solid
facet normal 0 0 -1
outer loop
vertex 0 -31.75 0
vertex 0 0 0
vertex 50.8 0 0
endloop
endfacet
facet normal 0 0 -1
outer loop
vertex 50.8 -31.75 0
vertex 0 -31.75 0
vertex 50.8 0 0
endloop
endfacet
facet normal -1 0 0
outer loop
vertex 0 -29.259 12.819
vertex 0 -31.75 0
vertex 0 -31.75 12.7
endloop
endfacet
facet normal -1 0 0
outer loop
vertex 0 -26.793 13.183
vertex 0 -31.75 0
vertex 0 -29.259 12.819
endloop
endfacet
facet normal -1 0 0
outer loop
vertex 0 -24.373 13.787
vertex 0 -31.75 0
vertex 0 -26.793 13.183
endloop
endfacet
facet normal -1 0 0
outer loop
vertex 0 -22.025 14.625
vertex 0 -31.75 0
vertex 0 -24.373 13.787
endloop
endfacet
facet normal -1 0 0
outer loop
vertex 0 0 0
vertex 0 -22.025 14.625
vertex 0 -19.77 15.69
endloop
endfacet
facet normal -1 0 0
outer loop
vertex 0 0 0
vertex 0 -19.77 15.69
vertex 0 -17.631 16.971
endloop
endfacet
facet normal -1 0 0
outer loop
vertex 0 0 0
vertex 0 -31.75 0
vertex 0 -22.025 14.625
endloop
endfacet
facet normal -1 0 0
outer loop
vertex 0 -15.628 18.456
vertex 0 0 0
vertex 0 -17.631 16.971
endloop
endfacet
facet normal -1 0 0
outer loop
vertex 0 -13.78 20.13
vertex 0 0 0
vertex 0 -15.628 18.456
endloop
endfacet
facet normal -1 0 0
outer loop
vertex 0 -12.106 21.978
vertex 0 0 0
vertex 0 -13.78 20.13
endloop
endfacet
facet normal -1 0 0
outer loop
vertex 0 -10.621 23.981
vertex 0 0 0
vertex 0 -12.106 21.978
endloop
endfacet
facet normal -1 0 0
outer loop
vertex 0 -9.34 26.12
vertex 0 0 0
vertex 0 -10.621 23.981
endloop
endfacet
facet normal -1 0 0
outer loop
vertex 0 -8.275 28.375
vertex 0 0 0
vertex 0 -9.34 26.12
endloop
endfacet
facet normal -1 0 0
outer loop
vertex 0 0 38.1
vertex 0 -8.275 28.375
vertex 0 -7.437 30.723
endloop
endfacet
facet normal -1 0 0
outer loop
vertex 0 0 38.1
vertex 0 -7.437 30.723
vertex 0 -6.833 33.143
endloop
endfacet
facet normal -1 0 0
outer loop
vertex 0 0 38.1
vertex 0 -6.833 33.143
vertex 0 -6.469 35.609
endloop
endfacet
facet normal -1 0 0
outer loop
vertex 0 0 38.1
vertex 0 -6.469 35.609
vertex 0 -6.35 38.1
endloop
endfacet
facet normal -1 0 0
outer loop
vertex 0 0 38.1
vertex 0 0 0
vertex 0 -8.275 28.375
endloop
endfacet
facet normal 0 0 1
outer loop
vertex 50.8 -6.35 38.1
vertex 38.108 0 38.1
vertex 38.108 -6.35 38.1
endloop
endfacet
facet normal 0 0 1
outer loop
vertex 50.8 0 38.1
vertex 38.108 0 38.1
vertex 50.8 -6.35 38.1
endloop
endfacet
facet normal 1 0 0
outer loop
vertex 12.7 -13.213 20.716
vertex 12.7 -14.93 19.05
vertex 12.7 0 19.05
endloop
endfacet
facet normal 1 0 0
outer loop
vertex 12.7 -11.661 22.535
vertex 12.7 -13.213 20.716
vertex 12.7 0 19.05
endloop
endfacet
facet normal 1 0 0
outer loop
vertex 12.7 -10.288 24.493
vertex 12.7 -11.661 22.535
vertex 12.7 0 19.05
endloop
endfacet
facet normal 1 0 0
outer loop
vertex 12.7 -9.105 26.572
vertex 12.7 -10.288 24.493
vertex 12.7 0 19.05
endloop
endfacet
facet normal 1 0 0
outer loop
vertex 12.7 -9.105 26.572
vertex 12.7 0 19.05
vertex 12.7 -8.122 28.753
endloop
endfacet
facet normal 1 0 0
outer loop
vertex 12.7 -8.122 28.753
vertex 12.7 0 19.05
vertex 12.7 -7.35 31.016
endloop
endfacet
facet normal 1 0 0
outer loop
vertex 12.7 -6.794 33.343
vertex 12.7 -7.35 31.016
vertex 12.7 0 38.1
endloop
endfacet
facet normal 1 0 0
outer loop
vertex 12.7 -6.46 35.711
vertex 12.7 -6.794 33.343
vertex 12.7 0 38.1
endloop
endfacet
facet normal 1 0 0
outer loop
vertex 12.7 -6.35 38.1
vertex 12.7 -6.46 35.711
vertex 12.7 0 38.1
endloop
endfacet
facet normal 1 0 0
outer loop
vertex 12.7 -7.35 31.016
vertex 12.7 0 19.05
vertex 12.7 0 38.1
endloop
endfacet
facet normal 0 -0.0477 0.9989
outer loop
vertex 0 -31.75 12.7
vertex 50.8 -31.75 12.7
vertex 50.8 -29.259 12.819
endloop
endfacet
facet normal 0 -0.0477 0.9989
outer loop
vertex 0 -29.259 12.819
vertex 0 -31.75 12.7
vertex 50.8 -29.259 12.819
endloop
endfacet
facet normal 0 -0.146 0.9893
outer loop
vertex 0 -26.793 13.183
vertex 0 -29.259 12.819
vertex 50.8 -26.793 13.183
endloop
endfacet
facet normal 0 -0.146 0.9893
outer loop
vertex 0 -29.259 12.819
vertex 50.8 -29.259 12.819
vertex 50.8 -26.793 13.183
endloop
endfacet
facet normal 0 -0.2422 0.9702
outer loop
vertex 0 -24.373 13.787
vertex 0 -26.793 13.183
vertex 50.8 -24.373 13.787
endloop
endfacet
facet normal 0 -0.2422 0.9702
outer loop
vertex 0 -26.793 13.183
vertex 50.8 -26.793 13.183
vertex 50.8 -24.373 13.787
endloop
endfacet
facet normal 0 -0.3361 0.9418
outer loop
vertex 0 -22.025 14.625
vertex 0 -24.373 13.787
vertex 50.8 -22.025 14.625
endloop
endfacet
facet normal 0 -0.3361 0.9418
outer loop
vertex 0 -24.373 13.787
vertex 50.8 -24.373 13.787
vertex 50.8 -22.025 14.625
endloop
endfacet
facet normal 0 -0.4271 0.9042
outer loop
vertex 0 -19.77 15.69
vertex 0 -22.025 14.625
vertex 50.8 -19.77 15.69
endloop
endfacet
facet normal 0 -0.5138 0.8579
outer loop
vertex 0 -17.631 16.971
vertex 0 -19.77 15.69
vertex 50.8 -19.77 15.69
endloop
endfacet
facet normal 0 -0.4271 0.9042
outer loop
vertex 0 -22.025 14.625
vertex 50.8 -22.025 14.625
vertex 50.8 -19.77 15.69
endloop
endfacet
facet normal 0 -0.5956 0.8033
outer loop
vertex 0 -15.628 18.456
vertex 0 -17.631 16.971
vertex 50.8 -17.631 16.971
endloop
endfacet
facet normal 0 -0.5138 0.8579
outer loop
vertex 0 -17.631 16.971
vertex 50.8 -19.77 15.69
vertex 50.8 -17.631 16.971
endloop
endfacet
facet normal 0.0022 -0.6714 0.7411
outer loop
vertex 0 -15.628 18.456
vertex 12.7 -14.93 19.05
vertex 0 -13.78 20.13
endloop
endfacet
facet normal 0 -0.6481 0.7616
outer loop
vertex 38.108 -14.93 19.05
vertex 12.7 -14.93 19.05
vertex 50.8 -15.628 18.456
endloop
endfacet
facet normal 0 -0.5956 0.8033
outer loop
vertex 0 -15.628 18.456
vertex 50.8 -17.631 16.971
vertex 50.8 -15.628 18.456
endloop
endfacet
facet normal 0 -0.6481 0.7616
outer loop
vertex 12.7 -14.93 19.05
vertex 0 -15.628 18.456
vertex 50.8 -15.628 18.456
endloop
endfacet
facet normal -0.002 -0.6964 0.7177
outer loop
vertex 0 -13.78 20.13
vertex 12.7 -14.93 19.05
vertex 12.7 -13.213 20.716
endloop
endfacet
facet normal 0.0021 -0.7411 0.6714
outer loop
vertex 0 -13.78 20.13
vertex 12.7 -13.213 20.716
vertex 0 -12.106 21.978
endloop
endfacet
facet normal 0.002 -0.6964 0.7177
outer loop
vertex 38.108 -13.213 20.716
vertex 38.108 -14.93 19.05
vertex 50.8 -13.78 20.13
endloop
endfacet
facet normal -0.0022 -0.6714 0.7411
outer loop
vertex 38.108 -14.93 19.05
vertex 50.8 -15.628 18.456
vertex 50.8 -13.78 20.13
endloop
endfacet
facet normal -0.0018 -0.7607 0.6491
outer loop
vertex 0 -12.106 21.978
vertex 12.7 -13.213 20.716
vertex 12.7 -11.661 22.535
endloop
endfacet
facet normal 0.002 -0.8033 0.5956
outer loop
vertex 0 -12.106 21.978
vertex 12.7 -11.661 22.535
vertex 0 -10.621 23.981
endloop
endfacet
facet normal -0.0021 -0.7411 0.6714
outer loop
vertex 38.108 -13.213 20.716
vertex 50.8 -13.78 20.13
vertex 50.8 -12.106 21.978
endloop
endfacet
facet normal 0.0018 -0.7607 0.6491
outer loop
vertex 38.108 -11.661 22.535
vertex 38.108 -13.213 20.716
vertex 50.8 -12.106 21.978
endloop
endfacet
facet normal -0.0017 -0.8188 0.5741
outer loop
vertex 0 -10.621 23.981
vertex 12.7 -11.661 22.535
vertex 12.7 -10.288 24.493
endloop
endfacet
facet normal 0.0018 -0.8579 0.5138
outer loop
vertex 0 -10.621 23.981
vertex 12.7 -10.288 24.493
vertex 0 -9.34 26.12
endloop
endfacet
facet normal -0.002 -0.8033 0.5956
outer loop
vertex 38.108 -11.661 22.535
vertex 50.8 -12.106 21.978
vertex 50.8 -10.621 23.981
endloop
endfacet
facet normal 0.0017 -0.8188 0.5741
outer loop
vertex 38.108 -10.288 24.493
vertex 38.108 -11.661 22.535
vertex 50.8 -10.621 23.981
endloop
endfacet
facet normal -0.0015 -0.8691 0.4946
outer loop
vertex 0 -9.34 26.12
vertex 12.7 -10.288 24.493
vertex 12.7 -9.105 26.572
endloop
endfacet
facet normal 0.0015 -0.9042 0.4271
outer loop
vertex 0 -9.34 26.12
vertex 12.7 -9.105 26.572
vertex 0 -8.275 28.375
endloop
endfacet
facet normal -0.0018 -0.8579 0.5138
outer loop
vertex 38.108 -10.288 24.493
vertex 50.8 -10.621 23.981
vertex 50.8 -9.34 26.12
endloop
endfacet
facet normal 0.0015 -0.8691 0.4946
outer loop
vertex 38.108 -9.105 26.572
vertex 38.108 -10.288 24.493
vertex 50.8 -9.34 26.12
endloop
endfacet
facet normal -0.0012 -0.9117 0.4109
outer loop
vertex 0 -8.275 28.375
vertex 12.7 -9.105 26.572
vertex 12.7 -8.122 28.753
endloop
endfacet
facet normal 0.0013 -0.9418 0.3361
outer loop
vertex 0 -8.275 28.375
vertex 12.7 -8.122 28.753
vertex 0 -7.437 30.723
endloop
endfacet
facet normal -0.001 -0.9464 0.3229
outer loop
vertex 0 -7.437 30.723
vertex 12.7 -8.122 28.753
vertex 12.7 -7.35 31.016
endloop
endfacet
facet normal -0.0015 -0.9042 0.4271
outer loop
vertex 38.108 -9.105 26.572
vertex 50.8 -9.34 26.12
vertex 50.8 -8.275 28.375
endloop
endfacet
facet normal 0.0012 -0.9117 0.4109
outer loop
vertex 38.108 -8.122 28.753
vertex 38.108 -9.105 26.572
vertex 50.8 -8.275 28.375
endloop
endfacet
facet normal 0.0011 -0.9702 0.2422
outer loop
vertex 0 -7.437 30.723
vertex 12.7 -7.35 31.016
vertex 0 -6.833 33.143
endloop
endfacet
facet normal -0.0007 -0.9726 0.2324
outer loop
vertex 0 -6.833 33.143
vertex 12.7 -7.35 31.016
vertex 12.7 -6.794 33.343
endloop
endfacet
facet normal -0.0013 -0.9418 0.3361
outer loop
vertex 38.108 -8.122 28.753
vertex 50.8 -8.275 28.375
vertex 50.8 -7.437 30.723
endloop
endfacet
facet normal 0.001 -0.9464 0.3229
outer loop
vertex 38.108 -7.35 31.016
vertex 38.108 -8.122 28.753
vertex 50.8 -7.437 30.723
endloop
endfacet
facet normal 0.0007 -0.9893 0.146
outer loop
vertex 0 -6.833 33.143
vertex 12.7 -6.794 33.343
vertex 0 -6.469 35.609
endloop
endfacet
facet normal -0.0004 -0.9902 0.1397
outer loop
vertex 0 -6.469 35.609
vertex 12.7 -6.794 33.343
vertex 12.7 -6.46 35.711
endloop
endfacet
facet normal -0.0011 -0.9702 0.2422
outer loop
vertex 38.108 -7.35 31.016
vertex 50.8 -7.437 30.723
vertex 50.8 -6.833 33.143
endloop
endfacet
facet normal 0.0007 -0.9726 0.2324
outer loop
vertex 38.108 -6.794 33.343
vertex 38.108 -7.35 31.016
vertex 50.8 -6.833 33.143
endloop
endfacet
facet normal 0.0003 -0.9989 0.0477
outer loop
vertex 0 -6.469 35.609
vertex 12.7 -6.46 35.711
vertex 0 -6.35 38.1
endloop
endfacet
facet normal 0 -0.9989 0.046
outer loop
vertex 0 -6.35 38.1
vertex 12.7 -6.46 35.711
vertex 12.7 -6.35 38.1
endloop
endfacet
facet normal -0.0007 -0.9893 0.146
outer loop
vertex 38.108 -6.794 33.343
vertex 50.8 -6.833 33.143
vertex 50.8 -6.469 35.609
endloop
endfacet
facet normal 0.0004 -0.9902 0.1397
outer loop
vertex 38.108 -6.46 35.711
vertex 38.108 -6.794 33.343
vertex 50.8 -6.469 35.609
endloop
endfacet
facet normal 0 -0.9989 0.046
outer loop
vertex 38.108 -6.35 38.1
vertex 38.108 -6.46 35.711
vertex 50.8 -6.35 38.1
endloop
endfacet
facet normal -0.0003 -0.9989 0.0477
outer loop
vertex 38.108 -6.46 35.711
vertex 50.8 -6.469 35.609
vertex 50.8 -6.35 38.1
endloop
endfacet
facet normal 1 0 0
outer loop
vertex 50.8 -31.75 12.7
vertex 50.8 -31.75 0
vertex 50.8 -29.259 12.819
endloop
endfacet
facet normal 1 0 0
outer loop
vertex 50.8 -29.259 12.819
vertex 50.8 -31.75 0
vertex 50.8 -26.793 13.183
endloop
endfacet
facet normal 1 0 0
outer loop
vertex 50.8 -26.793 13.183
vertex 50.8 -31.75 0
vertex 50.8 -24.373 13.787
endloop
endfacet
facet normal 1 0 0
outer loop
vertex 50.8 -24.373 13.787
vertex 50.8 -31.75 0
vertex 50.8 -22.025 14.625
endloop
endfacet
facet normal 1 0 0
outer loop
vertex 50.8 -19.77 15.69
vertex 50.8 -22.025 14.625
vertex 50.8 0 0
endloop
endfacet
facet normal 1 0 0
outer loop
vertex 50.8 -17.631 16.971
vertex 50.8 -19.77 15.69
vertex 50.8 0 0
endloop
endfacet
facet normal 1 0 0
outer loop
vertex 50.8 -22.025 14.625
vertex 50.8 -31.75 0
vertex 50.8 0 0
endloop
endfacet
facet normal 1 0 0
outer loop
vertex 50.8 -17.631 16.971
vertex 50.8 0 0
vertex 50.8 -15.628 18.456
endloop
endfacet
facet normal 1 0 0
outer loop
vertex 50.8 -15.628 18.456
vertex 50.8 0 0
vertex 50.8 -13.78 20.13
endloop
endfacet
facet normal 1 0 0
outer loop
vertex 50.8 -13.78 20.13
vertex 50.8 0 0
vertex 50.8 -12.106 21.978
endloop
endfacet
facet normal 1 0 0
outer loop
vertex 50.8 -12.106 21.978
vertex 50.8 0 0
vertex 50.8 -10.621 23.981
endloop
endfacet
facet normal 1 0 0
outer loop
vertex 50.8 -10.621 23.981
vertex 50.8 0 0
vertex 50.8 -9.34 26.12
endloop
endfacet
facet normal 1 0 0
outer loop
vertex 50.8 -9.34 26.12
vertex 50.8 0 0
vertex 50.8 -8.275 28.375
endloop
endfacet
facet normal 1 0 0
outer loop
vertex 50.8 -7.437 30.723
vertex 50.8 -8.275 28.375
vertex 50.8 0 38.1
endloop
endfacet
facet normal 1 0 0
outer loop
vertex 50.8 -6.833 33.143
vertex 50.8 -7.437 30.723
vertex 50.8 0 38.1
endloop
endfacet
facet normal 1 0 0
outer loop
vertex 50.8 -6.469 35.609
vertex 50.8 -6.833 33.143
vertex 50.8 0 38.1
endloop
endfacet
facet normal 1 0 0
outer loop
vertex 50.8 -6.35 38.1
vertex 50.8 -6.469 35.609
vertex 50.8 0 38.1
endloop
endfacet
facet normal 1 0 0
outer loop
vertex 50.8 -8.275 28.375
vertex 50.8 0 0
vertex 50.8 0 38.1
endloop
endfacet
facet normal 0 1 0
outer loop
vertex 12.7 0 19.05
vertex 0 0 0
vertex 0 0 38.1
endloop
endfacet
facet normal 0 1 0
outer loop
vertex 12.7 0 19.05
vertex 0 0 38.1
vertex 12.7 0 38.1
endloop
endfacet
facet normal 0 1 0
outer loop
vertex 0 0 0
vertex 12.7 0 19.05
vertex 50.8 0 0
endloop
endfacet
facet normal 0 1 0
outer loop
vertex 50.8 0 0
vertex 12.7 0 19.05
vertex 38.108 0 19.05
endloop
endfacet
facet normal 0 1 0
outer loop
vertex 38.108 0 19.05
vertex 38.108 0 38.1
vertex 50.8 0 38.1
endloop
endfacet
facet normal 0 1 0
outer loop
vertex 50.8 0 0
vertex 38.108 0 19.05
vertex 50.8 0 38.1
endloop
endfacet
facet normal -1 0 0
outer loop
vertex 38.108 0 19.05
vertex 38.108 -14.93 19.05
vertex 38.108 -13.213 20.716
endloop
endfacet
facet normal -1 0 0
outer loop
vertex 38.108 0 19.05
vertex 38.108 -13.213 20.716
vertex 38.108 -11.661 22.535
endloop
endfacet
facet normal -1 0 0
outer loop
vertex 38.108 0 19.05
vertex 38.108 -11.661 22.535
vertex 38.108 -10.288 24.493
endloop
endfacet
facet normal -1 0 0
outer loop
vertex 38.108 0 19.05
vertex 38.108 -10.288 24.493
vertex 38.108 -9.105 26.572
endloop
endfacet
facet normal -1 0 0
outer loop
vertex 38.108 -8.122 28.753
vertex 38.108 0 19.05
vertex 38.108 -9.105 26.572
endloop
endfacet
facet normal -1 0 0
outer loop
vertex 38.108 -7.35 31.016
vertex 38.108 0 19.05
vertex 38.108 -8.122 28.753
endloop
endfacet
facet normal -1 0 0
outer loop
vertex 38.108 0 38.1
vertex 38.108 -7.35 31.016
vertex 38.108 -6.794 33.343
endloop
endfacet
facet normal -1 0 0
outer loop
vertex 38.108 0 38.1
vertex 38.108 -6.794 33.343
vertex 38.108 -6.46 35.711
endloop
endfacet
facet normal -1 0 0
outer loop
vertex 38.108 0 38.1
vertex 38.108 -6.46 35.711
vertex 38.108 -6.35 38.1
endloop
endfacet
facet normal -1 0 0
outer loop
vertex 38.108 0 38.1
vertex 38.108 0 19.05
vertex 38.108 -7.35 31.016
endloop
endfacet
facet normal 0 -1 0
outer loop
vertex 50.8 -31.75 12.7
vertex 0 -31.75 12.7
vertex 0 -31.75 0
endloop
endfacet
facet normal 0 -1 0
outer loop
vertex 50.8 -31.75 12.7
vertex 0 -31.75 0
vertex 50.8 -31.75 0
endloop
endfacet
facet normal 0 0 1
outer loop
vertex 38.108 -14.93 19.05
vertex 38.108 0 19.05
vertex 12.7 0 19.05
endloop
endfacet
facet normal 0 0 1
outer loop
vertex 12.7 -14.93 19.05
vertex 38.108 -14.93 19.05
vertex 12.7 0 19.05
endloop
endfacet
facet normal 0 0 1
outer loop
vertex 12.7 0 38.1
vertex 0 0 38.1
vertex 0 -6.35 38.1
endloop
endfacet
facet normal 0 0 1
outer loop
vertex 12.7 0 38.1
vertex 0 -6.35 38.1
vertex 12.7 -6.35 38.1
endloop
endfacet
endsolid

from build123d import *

# Parameters (mm, degrees)
F0_W     = 50.8
F0_H     = 38.1
F1_DEPTH = 31.75
F3_DEPTH = 50.801
F4_W     = 25.407727
F4_H     = 19.05
F5_DEPTH = 31.751


with BuildPart() as f1:
    # F0 (on Front) → F1 (new body)
    with BuildSketch(Plane.XZ):
        with Locations((25.4, 19.05)):
            Rectangle(F0_W, F0_H)
    extrude(amount=F1_DEPTH)

    # F2 (on face) → F3 (cut, through all)
    with BuildSketch(Plane.YZ.offset(50.8)):
        with BuildLine():
            Line((-31.75, 38.1), (-31.75, 12.7))
            ThreePointArc((-31.75, 12.7), (-13.78023, 20.13023), (-6.35, 38.1))
            Line((-6.35, 38.1), (-31.75, 38.1))
        make_face()
    extrude(amount=-F3_DEPTH, mode=Mode.SUBTRACT)

    # F4 (on face) → F5 (cut, through all)
    with BuildSketch(Plane(origin=(0, 0, 0), x_dir=(-1, 0, 0), z_dir=(0, 1, 0))):
        with Locations((-25.403863, 28.575)):
            Rectangle(F4_W, F4_H)
    extrude(amount=-F5_DEPTH, mode=Mode.SUBTRACT)


solid = f1.part
